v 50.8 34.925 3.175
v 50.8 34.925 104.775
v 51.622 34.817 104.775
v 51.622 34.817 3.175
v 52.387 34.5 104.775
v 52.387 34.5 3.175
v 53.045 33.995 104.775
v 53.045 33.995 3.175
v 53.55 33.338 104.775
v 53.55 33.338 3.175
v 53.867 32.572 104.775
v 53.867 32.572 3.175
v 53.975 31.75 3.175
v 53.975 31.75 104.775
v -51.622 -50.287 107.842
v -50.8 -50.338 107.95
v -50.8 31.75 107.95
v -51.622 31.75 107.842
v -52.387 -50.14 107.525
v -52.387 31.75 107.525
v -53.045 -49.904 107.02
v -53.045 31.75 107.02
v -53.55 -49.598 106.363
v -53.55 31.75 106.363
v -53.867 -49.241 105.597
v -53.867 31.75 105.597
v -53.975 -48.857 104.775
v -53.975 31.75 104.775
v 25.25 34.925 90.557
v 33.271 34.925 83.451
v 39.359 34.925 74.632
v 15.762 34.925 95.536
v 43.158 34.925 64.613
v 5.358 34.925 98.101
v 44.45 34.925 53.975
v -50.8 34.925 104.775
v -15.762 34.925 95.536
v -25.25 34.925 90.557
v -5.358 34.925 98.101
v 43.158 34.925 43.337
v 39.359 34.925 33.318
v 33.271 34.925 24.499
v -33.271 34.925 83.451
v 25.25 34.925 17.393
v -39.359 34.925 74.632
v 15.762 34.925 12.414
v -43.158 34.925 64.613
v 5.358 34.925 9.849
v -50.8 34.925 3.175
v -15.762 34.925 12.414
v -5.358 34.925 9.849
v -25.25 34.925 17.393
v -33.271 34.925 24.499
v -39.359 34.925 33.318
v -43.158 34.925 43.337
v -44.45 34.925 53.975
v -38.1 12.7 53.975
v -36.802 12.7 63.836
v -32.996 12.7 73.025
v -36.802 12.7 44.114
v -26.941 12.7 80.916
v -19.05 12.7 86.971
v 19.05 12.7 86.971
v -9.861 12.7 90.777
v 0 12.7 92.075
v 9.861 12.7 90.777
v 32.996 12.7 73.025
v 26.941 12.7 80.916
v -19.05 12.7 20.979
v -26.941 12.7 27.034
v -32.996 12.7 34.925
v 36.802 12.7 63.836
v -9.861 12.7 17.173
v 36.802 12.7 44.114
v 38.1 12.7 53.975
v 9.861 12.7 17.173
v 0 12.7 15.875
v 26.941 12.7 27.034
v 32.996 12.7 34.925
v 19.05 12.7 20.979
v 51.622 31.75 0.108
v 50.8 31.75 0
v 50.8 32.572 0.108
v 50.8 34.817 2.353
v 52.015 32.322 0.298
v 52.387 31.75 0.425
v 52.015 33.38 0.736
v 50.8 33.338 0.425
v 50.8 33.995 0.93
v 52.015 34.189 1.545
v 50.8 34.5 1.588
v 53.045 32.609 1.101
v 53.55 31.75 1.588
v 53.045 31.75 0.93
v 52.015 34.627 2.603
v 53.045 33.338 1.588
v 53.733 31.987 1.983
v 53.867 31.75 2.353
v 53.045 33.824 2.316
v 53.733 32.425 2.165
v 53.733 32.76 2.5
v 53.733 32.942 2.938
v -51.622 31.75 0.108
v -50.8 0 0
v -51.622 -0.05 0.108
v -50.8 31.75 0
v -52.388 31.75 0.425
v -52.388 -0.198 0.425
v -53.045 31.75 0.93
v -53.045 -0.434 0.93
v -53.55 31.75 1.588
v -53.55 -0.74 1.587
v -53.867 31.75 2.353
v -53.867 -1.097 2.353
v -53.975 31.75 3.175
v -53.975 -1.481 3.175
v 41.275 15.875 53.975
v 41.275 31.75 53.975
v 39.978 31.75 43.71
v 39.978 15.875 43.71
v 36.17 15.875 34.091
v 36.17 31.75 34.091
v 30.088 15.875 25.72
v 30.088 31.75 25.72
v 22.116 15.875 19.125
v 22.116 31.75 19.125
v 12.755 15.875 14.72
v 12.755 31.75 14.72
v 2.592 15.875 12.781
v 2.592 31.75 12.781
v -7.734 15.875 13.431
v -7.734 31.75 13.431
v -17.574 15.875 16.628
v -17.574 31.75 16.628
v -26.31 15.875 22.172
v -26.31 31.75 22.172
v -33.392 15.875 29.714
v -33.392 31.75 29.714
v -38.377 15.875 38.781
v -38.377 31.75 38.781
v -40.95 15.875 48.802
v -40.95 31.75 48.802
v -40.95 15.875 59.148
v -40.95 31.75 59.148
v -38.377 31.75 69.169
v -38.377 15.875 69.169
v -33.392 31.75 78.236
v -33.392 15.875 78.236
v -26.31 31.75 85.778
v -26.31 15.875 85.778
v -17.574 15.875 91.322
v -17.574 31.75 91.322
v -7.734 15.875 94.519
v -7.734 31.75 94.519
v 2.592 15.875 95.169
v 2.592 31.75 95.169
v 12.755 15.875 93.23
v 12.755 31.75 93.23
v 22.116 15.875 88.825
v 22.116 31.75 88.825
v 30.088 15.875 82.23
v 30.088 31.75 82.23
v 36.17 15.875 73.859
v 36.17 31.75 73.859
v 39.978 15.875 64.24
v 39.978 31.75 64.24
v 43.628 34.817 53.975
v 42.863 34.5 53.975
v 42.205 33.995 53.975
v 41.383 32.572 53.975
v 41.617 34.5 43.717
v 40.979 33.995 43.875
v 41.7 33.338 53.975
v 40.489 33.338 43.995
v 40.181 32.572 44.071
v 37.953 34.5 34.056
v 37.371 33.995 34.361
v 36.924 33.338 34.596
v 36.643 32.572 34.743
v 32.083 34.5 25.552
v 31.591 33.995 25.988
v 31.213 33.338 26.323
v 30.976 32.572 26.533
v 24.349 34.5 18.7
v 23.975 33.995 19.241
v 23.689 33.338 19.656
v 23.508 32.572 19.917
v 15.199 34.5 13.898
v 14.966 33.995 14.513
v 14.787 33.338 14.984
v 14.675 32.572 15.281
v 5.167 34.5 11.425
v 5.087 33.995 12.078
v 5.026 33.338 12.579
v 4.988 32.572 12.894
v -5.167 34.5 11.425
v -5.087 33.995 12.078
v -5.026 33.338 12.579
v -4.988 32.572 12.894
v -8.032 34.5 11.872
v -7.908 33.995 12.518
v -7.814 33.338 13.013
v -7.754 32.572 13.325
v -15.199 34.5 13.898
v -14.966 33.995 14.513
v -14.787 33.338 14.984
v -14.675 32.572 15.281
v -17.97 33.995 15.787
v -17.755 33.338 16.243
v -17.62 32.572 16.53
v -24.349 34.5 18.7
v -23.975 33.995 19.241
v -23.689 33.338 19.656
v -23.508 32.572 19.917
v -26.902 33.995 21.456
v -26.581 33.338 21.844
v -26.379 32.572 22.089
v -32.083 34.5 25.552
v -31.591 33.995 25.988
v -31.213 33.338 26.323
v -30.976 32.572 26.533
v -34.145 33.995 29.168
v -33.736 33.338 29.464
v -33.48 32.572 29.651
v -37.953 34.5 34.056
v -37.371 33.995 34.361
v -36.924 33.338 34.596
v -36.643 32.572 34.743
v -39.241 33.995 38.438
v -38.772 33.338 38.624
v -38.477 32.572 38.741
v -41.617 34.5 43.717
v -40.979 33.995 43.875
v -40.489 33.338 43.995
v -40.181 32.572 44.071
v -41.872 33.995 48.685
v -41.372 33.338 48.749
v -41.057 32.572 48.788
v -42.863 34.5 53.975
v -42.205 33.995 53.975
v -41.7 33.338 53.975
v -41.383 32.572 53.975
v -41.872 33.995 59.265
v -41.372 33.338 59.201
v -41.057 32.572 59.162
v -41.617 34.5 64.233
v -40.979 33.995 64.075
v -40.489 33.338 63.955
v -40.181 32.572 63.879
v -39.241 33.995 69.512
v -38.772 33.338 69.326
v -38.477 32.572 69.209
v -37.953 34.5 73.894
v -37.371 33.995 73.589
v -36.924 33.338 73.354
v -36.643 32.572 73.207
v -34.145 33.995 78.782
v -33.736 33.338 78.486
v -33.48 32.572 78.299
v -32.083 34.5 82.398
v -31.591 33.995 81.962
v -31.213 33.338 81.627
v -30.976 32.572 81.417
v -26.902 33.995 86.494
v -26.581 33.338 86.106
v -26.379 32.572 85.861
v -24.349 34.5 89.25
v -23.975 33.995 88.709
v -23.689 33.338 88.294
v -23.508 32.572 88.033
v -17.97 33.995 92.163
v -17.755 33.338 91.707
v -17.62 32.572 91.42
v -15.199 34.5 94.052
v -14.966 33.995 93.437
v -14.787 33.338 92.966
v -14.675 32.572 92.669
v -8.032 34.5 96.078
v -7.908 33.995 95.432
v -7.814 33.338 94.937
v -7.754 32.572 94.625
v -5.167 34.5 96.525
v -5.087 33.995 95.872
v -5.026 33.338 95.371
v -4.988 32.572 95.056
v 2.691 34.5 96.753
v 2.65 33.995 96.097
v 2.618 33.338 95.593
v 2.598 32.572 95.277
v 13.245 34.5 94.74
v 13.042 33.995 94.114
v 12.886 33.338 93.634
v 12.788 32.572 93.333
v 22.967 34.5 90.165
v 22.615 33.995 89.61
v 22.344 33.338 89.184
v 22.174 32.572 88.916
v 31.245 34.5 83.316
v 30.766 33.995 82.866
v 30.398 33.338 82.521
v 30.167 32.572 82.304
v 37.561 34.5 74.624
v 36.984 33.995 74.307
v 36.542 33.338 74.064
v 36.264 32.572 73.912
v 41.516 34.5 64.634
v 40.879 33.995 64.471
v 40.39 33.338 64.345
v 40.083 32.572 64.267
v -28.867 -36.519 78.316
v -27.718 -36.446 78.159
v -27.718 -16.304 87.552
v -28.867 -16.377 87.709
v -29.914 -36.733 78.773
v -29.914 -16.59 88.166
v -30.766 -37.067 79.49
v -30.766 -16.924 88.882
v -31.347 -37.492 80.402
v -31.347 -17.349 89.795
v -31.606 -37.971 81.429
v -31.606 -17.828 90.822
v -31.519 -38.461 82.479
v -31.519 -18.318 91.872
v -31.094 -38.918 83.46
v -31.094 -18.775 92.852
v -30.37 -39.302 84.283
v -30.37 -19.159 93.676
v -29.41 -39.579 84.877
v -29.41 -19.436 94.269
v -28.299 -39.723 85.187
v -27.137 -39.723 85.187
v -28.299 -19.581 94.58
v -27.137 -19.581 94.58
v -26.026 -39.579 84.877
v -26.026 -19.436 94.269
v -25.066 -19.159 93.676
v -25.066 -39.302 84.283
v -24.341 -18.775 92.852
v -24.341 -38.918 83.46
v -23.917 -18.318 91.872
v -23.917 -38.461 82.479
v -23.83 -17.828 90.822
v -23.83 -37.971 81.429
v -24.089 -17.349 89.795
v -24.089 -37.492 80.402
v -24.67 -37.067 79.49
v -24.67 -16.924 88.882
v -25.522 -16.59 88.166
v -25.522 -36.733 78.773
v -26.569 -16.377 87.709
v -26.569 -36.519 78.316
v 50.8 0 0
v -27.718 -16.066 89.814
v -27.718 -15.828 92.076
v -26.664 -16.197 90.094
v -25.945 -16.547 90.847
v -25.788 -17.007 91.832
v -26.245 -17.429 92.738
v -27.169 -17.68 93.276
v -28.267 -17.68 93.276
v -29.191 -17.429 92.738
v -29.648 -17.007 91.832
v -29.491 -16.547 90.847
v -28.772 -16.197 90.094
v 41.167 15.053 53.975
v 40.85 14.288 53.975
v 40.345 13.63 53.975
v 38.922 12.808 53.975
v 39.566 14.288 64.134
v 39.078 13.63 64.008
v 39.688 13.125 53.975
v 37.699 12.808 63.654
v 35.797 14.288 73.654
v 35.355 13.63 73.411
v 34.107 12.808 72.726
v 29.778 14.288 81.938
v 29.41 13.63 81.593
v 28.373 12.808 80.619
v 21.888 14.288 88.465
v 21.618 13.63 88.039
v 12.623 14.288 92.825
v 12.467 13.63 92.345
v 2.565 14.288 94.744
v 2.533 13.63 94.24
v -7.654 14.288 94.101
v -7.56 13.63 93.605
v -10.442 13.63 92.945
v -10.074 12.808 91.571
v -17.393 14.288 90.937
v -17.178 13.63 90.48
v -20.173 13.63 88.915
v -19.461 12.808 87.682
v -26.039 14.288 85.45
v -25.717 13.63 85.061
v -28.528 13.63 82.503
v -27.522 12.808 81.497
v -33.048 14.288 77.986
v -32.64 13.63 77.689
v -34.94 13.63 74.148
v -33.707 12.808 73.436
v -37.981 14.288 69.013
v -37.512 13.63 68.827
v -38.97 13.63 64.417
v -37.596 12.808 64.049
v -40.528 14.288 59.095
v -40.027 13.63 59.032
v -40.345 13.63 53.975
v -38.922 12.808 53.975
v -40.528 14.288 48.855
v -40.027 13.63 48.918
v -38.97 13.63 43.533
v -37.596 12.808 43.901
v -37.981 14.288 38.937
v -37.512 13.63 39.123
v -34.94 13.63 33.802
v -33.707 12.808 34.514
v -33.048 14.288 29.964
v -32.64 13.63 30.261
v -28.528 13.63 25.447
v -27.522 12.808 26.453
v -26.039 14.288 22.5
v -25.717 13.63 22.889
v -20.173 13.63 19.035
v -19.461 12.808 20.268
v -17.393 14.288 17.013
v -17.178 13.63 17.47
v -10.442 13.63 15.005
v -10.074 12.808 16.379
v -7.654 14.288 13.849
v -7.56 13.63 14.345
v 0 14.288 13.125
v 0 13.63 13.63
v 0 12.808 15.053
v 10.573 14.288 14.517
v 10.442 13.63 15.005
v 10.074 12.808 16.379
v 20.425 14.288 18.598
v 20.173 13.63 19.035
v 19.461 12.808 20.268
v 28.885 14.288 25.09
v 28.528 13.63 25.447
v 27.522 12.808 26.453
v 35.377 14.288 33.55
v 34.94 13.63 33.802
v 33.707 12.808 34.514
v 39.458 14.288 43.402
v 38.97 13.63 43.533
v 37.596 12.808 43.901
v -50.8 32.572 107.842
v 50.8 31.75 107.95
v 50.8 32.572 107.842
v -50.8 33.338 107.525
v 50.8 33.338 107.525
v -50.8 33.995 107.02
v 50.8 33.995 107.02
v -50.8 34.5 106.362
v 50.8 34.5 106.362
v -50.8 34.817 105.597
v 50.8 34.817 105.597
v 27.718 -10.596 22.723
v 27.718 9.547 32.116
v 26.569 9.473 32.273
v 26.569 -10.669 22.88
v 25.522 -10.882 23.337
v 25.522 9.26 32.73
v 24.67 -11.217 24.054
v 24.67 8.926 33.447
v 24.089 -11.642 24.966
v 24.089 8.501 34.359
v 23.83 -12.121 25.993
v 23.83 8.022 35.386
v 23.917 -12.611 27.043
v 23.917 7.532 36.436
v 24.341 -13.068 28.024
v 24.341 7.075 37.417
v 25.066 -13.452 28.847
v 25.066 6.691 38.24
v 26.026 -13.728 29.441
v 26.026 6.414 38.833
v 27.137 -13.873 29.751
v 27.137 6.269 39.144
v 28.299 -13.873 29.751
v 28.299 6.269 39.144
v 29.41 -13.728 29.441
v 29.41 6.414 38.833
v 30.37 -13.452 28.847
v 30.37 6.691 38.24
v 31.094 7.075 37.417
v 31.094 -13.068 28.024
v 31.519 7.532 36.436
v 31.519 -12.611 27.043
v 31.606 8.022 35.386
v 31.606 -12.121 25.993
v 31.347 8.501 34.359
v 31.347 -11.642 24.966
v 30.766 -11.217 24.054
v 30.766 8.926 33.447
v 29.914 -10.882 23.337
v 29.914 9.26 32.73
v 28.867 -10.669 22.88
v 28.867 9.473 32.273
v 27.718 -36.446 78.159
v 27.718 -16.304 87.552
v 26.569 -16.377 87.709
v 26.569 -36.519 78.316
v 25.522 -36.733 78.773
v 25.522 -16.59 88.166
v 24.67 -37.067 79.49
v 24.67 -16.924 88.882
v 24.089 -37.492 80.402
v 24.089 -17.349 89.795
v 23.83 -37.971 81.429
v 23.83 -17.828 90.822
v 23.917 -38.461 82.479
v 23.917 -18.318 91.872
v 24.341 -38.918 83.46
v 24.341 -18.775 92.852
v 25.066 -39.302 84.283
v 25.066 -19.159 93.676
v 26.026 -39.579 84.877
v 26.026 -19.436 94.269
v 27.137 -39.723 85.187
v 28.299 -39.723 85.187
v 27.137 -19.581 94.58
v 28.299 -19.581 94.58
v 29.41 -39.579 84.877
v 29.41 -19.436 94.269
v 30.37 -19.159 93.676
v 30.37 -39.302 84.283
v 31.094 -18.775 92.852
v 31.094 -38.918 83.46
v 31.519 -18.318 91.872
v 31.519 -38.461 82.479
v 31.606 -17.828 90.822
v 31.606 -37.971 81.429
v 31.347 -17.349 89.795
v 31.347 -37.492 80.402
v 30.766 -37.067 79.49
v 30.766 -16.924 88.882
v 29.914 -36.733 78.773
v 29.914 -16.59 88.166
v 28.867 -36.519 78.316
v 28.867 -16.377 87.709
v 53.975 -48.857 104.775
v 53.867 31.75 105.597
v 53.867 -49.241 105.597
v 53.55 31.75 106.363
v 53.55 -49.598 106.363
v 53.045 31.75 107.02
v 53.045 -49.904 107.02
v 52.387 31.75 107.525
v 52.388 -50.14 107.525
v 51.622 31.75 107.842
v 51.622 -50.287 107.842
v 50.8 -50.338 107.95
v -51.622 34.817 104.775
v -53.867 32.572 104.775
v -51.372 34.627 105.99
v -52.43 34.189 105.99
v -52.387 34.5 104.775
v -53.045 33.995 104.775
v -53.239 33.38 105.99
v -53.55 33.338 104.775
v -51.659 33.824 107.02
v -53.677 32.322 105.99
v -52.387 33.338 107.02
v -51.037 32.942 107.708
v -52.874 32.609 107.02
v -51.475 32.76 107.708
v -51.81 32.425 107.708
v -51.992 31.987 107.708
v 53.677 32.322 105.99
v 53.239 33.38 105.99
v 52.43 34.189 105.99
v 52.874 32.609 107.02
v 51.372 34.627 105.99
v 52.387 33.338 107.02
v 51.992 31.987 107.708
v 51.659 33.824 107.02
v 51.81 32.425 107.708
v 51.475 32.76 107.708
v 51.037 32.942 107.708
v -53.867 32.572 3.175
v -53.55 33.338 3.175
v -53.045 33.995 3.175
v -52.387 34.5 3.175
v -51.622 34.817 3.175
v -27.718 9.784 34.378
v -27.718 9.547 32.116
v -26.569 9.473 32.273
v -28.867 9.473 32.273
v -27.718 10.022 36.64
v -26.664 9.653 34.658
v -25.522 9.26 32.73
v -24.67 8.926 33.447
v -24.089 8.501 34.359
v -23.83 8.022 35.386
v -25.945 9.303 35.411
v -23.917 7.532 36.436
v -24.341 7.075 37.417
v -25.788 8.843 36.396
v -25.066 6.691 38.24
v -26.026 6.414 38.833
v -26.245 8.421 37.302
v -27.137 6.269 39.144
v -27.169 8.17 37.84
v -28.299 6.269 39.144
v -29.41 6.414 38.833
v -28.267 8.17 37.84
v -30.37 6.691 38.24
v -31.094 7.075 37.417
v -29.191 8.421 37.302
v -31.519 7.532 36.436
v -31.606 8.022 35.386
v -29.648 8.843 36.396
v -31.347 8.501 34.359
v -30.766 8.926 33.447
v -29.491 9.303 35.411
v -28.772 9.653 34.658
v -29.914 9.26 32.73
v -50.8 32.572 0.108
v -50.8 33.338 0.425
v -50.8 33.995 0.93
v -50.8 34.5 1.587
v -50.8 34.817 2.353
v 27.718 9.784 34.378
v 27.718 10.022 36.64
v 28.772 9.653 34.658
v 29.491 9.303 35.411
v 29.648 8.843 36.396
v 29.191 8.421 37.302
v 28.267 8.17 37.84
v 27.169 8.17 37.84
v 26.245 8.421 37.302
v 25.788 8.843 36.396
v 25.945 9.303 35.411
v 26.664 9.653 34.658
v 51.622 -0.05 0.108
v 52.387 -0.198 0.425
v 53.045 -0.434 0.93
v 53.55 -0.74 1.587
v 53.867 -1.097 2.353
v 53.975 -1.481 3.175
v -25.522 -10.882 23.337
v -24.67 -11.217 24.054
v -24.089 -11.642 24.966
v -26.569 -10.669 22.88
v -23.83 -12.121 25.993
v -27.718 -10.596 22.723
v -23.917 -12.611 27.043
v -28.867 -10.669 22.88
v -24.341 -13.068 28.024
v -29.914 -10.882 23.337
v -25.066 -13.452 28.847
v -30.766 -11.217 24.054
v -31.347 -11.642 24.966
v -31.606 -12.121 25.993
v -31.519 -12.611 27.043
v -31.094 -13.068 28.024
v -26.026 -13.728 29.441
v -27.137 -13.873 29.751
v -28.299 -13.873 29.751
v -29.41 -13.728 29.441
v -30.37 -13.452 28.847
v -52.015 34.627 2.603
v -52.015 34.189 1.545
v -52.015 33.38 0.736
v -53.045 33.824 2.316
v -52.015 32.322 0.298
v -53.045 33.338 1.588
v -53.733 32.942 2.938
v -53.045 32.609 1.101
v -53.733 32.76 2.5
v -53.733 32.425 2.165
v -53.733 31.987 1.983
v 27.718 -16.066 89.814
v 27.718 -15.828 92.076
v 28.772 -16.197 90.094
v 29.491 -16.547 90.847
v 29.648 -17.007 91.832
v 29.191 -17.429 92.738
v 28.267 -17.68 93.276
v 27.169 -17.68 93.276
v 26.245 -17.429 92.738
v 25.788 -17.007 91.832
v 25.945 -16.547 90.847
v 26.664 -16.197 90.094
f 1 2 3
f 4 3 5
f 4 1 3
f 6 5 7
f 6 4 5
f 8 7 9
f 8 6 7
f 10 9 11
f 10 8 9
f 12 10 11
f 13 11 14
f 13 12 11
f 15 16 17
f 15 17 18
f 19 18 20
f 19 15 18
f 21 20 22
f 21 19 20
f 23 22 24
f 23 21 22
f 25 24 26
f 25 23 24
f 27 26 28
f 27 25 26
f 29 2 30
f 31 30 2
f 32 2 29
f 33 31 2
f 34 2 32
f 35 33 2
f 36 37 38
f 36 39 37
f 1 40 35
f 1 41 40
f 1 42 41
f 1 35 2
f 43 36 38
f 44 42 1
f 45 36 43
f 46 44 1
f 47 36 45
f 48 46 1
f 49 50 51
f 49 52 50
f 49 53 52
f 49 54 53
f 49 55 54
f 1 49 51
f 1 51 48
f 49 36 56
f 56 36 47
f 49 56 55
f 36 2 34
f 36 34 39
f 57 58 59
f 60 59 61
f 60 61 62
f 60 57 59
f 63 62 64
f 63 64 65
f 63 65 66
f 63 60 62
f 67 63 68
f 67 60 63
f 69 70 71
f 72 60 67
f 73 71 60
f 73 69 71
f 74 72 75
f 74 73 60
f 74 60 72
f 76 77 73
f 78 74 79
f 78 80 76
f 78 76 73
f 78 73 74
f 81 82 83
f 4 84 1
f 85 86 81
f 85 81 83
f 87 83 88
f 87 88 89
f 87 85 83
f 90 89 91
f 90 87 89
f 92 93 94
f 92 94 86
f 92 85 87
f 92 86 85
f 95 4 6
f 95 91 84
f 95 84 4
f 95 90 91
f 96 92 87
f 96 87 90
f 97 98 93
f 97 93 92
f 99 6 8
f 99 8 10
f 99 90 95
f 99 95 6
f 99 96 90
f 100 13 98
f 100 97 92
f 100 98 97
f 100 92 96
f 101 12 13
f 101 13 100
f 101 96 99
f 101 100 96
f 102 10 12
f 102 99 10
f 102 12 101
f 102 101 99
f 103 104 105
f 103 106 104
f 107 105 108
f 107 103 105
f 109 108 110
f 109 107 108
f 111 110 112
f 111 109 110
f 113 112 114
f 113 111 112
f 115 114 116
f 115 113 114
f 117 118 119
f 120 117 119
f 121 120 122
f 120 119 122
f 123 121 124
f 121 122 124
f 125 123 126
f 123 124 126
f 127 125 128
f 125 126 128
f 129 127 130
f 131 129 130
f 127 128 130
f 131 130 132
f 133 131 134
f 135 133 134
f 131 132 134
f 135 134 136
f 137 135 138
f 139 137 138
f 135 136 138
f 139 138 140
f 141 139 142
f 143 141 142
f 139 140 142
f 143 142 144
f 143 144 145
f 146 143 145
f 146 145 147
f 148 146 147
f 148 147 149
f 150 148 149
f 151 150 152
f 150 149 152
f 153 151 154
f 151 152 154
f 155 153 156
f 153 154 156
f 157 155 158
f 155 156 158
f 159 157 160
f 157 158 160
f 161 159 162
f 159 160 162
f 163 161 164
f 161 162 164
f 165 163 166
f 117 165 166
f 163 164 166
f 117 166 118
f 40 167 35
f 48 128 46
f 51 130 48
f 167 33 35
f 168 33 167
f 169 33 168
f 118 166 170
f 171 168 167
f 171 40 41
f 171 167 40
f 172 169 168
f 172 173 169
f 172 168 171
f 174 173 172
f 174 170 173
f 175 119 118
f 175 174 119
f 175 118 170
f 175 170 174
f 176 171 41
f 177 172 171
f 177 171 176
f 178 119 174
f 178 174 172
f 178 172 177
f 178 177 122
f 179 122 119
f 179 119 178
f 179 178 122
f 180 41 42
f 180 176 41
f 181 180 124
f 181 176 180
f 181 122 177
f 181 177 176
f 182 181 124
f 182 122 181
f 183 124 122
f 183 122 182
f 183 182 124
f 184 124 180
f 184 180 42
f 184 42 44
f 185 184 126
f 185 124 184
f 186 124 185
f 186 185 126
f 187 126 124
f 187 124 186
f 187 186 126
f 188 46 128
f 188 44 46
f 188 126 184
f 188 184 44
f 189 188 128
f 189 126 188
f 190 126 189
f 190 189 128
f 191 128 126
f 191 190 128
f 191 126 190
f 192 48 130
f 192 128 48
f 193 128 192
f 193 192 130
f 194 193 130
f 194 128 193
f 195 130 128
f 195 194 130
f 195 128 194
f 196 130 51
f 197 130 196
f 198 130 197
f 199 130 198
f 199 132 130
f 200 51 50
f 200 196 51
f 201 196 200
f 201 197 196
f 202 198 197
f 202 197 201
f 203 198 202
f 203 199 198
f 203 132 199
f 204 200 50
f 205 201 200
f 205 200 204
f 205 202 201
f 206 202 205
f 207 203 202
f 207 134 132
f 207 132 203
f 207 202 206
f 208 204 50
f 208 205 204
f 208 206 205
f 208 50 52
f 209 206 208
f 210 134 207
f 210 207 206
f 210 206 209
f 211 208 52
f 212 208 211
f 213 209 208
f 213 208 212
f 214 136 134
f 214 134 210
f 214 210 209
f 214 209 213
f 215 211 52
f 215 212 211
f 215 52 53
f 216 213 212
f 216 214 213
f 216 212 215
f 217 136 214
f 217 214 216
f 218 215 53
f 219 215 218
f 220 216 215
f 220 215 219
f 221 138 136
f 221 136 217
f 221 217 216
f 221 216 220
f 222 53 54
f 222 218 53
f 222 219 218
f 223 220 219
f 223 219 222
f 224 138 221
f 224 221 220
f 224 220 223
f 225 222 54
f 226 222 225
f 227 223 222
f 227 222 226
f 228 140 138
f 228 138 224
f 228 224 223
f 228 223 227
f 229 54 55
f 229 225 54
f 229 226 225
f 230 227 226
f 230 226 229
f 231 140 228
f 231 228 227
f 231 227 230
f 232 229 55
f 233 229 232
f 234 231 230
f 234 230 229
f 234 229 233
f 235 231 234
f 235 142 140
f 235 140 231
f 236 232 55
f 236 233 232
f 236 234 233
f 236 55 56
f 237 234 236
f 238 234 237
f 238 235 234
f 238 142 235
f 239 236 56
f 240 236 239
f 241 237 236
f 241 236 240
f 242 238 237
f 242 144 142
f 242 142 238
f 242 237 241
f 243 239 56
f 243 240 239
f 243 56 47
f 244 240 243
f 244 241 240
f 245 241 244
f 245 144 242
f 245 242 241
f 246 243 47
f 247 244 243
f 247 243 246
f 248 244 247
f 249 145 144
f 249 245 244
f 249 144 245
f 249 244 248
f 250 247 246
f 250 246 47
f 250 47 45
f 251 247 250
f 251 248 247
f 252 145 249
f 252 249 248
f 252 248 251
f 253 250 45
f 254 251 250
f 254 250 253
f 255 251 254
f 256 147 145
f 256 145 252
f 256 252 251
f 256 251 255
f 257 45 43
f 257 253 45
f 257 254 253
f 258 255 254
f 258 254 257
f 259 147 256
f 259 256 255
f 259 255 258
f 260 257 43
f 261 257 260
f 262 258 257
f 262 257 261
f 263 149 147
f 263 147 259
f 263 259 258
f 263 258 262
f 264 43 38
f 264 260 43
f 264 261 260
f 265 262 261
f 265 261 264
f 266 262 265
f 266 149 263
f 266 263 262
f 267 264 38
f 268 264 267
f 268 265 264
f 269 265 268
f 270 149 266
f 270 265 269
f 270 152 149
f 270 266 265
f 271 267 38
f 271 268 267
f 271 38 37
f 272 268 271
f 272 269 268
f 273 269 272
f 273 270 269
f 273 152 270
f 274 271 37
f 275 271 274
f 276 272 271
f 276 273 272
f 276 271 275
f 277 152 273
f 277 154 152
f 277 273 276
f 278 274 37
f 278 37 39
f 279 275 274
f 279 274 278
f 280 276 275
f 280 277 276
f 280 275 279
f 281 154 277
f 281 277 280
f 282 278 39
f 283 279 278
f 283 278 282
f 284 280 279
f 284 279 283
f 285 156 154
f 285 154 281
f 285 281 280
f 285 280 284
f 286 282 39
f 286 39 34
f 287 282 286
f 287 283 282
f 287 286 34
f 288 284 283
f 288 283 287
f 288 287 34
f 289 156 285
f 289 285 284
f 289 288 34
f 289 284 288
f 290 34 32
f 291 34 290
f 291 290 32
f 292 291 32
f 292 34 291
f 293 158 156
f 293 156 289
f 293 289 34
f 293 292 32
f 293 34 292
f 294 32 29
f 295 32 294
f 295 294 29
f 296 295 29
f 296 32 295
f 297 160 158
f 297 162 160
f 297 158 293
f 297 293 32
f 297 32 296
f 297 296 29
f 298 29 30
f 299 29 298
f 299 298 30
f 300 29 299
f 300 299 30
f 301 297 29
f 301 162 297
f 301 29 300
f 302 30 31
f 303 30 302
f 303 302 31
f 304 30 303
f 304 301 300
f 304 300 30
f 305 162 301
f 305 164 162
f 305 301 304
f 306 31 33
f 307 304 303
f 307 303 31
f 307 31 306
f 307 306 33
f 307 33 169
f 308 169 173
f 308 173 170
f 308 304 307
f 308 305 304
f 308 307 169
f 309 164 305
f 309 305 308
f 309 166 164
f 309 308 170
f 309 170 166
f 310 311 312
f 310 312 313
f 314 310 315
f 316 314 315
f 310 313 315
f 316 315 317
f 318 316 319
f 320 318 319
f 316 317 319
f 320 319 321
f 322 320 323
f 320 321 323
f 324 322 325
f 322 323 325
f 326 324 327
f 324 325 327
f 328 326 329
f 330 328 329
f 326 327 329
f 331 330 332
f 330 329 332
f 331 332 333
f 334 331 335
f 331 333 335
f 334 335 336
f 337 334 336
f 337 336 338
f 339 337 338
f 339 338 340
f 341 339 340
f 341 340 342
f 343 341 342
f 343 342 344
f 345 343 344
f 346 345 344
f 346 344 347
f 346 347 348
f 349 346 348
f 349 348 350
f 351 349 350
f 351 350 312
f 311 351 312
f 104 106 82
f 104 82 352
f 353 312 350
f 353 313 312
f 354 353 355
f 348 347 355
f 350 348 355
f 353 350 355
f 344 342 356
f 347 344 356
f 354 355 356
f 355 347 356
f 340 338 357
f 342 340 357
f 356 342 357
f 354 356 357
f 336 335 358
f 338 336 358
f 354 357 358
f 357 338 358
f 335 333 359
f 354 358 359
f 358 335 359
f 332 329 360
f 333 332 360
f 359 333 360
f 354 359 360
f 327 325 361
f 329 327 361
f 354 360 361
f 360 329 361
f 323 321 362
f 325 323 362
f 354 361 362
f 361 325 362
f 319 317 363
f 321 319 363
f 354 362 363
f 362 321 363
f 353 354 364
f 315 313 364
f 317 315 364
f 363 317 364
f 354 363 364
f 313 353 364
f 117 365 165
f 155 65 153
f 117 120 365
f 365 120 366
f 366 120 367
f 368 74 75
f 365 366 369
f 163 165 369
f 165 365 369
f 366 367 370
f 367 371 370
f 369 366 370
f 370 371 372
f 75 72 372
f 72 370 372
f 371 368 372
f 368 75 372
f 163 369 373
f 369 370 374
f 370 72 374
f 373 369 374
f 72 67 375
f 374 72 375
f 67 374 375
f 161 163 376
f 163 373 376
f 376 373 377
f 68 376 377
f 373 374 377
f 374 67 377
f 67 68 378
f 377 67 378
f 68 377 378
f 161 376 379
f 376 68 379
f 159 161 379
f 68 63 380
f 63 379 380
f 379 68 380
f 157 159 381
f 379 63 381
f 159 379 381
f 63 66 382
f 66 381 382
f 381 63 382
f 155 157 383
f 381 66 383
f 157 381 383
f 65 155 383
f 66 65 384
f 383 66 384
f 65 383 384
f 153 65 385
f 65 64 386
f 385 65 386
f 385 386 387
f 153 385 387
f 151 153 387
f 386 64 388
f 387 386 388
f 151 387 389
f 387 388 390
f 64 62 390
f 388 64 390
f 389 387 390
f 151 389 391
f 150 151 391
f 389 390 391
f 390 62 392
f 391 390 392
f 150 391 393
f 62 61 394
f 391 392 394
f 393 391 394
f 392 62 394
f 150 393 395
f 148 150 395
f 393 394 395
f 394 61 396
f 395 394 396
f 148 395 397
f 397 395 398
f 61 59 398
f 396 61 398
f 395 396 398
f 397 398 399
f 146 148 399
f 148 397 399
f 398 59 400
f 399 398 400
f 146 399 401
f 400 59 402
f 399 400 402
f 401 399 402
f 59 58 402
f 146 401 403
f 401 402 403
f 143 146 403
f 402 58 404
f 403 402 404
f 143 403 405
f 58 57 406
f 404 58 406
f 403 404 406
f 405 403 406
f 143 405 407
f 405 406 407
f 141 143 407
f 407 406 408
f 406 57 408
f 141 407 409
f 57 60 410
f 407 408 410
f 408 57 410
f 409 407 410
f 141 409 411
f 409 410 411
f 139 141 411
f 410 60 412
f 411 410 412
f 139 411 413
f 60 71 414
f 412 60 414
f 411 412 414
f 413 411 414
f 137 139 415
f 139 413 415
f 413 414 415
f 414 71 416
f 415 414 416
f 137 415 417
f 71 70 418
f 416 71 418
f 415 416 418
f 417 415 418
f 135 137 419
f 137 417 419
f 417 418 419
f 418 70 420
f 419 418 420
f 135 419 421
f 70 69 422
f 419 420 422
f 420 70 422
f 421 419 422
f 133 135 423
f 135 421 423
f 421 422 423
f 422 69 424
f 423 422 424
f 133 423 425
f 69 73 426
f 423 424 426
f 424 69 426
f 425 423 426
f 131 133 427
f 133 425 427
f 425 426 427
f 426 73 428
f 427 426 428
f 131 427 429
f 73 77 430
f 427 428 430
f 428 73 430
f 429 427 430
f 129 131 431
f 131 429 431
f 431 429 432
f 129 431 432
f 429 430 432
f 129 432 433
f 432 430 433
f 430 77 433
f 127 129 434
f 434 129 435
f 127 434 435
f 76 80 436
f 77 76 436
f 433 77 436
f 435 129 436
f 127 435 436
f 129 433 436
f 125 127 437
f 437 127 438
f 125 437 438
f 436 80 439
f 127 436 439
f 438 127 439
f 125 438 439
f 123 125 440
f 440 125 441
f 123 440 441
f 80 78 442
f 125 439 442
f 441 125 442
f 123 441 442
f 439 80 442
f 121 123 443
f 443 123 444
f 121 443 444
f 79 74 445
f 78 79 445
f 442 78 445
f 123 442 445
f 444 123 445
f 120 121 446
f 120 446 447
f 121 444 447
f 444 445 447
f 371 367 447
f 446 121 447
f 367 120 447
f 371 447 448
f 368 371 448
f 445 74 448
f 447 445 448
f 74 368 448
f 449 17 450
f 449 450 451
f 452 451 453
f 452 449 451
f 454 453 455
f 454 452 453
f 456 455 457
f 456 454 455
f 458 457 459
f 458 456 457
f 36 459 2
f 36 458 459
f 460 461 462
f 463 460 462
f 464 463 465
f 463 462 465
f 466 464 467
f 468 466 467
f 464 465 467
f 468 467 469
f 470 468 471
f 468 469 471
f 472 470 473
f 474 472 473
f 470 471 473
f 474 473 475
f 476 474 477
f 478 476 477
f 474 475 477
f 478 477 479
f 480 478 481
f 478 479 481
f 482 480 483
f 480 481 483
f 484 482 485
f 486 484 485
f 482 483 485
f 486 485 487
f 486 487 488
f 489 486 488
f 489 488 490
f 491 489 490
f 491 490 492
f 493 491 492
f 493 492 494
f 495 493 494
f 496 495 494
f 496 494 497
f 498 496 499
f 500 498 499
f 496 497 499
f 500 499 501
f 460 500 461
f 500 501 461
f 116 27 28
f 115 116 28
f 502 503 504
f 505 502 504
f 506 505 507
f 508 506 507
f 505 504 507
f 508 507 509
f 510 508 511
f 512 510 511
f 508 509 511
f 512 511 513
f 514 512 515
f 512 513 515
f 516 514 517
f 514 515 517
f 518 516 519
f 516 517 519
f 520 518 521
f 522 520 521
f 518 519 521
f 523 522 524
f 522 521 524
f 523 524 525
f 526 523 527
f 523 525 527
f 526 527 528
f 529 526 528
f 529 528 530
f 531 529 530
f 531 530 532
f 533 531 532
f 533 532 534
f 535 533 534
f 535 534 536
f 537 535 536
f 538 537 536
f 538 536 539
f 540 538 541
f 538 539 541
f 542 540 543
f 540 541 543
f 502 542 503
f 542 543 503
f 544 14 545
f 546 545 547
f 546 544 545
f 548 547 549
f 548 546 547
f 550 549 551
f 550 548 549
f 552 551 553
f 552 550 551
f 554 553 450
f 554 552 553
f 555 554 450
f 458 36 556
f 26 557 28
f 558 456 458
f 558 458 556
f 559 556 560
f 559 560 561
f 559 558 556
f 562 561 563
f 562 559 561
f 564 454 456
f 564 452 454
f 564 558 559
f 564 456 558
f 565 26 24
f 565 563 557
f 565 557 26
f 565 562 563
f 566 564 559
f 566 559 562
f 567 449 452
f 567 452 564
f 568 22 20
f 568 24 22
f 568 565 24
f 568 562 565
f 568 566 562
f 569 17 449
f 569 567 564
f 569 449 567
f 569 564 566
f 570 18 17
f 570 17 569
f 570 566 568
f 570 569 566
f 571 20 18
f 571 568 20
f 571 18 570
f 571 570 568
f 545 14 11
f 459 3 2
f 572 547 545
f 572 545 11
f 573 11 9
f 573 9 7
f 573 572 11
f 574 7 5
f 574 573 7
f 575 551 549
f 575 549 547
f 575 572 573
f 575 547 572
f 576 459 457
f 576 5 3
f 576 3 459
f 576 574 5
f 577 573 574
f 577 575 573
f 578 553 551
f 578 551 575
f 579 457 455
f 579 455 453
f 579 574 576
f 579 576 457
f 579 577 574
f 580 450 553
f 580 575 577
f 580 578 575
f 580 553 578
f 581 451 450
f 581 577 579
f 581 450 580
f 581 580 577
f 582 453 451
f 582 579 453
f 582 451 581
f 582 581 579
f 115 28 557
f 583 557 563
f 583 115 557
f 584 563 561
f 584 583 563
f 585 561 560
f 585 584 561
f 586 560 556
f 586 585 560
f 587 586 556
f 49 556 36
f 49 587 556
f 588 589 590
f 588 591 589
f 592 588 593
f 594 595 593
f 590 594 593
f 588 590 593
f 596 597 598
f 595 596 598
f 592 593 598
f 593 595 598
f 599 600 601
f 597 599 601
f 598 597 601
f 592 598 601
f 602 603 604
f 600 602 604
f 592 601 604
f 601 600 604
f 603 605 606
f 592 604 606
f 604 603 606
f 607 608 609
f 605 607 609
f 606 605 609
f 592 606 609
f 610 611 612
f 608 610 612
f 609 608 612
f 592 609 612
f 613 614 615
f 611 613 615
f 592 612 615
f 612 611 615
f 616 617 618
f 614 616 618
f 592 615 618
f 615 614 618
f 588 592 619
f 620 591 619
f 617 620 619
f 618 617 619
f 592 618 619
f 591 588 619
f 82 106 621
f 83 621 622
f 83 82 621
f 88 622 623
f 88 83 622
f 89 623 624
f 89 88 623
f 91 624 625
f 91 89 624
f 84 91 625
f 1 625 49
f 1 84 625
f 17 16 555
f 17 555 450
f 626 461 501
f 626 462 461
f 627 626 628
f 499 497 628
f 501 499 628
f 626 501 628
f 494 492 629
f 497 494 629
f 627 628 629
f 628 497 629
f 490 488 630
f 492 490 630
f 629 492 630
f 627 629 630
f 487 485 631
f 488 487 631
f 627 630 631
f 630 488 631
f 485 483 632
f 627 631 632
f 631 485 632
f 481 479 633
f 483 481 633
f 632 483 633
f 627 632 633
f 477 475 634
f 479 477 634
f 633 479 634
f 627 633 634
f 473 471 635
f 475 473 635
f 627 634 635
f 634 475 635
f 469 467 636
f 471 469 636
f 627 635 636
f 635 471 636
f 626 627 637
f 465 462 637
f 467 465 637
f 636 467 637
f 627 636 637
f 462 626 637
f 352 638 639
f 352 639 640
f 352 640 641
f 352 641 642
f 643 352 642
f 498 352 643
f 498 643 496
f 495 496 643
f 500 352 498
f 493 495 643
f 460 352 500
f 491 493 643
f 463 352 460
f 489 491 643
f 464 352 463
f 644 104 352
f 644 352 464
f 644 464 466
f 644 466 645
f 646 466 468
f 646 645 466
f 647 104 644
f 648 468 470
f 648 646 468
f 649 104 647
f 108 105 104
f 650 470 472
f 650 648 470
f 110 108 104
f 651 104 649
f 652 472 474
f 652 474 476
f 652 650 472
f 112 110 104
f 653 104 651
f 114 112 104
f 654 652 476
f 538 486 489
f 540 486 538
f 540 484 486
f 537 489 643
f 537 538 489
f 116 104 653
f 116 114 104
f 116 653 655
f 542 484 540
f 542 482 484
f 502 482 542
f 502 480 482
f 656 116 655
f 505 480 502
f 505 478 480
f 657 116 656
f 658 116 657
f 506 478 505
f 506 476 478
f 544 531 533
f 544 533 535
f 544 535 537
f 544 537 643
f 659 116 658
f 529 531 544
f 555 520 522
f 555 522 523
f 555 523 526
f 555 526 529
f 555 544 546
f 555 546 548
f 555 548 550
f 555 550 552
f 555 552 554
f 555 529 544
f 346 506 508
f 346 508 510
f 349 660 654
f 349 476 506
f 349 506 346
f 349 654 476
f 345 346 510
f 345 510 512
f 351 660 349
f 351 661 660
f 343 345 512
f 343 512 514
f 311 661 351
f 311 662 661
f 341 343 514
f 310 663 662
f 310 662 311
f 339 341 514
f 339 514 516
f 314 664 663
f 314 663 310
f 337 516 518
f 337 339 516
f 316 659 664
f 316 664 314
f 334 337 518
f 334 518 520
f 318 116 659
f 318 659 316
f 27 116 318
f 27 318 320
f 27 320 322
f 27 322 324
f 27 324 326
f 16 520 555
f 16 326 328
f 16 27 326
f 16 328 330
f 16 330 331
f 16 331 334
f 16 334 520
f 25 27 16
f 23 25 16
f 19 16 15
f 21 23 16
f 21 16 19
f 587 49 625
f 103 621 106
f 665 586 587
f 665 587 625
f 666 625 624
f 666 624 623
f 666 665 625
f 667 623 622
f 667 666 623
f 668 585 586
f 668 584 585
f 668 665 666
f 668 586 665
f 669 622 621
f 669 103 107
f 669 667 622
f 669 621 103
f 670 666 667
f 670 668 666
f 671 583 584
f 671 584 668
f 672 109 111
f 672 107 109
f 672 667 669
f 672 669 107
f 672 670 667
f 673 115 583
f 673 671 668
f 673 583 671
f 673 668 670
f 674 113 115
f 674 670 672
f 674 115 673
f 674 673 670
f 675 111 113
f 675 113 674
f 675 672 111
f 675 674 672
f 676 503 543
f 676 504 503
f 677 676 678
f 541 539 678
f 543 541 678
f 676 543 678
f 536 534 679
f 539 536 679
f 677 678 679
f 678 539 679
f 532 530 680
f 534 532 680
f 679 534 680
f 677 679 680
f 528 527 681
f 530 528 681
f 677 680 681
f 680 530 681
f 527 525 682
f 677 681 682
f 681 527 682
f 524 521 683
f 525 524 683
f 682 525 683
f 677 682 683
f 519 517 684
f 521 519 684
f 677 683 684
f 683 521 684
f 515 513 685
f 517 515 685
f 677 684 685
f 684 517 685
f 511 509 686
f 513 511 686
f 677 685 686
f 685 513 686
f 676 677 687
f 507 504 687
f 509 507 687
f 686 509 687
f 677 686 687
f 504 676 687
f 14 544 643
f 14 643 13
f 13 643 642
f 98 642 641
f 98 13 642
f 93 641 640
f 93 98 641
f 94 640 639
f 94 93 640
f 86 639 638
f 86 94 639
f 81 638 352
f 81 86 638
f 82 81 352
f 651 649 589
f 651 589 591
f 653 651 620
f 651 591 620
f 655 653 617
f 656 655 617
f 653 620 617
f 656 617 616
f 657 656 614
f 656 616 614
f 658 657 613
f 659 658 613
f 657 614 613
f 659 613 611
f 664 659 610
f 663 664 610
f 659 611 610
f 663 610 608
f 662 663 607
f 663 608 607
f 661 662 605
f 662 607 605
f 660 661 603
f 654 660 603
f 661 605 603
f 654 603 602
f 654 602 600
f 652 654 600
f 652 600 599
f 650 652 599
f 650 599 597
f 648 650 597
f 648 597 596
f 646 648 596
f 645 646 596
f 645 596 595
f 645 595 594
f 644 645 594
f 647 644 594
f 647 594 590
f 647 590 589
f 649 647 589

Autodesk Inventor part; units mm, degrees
ref_plane "YZ Plane" through (0, 0, 0) normal (1, 0, 0) x (0, 1, 0)
ref_plane "XZ Plane" through (0, 0, 0) normal (0, 1, 0) x (-1, 0, 0)
ref_plane "XY Plane" through (0, 0, 0) normal (0, 0, 1) x (1, 0, 0)
sketch "Sketch1" plane through (0, 0, 0) normal (1, 0, 0) x (0, 1, 0)
  line L0 (0, 0) -> (-50.3379, 107.95)
  line L1 (-50.3379, 107.95) -> (34.925, 107.95)
  line L2 (34.925, 107.95) -> (34.925, 0)
  line L3 (34.925, 0) -> (0, 0)
  line L4 (0, 0) -> (0, 107.95) construction
  dimension "tilt" = 25
  dimension "baseDepth" = 107.95
  dimension "holderHeight" = 34.925
extrude "Extrusion1" add sketch "Sketch1" along normal mid plane 107.95
sketch "Sketch2" plane through (-53.975, 34.925, 107.95) normal (0, 1, 0) x (1, 0, 0)
  line L0 (107.95, 0) -> (0, 0) construction
  line L1 (107.95, 0) -> (107.95, 107.95) construction
  line L2 (0, 0) -> (107.95, 107.95) construction
  line L3 (0, 107.95) -> (107.95, 107.95) construction
  line L4 (0, 107.95) -> (107.95, 0) construction
  circle A0 centre (53.975, 53.975) radius 41.275
  point P0 (53.975, 107.95)
  dimension "d5" = 82.55
extrude "Extrusion2" cut sketch "Sketch2" against normal blind 22.225
sketch "Sketch4" plane through (-53.975, 0, 0) normal (0, -0.9063078, -0.4226183) x (1, 0, 0)
  line L0 (107.95, 119.1096) -> (107.95, 0) construction
  line L1 (107.95, 119.1096) -> (0, 119.1096) construction
  line L2 (107.95, 0) -> (0, 119.1096) construction
  line L3 (0, 0) -> (107.95, 0) construction
  line L4 (0, 0) -> (107.95, 119.1096) construction
  circle A0 centre (53.975, 59.5548) radius 41.275 construction
  ellipse E0 centre (53.975, 43.5507) end of major axis (12.7, 43.5507) minor radius 37.4079 projected
  point P0 (53.975, 0)
  point P1 (81.6929, 90.1382)
  point P2 (81.6929, 28.9715)
  point P3 (26.2571, 28.9715)
  point P4 (26.2571, 90.1382)
  dimension "d14" = 82.55
hole "Hole2" at (27.7179, -38.094, 81.6929) at (27.7179, -12.2439, 26.2571) at (-27.7179, -12.2439, 26.2571) at (-27.7179, -38.094, 81.6929) direction (0, 0.9063078, 0.4226183) diameter 7.7978 depth 22.225 tip angle 118 thread size "3/8-16 UNC" class "2B" standard "ANSI Unified Screw Threads"
fillet "Fillet1" radius 3.175 2 edges at (-41.275, 34.925, 53.975) (-41.275, 12.7, 53.975)
fillet "Fillet2" radius 3.175 4 edges at (0, 34.925, 107.95) (-53.975, 34.925, 53.975) (0, 34.925, 0) (53.975, 34.925, 53.975)
fillet "Fillet3" radius 3.175 8 edges at (-53.0451, 33.9951, 107.0201) (-53.975, -9.294, 107.95) (53.0451, 33.9951, 107.0201) (53.975, -9.294, 107.95) (53.0451, 33.9951, 0.9299) (53.975, 15.875, 0) (-53.0451, 33.9951, 0.9299) (-53.975, 15.875, 0)
equation "\"d5\" = cupDiam"
equation "\"d6\" = cupDepth"
equation "\"d14\" = cupDiam"
equation "\"d27\" = threadHoleDepth"
equation "\"d29\" = filet"
equation "\"d30\" = filet"
equation "\"d31\" = filet"
equation "\"cupDiam\" = 82.55"
equation "\"cupDepth\" = 22.225"
equation "\"threadHoleDepth\" = 22.225"
equation "\"filet\" = 3.175"
properties part number "ChickenCupHolder"
